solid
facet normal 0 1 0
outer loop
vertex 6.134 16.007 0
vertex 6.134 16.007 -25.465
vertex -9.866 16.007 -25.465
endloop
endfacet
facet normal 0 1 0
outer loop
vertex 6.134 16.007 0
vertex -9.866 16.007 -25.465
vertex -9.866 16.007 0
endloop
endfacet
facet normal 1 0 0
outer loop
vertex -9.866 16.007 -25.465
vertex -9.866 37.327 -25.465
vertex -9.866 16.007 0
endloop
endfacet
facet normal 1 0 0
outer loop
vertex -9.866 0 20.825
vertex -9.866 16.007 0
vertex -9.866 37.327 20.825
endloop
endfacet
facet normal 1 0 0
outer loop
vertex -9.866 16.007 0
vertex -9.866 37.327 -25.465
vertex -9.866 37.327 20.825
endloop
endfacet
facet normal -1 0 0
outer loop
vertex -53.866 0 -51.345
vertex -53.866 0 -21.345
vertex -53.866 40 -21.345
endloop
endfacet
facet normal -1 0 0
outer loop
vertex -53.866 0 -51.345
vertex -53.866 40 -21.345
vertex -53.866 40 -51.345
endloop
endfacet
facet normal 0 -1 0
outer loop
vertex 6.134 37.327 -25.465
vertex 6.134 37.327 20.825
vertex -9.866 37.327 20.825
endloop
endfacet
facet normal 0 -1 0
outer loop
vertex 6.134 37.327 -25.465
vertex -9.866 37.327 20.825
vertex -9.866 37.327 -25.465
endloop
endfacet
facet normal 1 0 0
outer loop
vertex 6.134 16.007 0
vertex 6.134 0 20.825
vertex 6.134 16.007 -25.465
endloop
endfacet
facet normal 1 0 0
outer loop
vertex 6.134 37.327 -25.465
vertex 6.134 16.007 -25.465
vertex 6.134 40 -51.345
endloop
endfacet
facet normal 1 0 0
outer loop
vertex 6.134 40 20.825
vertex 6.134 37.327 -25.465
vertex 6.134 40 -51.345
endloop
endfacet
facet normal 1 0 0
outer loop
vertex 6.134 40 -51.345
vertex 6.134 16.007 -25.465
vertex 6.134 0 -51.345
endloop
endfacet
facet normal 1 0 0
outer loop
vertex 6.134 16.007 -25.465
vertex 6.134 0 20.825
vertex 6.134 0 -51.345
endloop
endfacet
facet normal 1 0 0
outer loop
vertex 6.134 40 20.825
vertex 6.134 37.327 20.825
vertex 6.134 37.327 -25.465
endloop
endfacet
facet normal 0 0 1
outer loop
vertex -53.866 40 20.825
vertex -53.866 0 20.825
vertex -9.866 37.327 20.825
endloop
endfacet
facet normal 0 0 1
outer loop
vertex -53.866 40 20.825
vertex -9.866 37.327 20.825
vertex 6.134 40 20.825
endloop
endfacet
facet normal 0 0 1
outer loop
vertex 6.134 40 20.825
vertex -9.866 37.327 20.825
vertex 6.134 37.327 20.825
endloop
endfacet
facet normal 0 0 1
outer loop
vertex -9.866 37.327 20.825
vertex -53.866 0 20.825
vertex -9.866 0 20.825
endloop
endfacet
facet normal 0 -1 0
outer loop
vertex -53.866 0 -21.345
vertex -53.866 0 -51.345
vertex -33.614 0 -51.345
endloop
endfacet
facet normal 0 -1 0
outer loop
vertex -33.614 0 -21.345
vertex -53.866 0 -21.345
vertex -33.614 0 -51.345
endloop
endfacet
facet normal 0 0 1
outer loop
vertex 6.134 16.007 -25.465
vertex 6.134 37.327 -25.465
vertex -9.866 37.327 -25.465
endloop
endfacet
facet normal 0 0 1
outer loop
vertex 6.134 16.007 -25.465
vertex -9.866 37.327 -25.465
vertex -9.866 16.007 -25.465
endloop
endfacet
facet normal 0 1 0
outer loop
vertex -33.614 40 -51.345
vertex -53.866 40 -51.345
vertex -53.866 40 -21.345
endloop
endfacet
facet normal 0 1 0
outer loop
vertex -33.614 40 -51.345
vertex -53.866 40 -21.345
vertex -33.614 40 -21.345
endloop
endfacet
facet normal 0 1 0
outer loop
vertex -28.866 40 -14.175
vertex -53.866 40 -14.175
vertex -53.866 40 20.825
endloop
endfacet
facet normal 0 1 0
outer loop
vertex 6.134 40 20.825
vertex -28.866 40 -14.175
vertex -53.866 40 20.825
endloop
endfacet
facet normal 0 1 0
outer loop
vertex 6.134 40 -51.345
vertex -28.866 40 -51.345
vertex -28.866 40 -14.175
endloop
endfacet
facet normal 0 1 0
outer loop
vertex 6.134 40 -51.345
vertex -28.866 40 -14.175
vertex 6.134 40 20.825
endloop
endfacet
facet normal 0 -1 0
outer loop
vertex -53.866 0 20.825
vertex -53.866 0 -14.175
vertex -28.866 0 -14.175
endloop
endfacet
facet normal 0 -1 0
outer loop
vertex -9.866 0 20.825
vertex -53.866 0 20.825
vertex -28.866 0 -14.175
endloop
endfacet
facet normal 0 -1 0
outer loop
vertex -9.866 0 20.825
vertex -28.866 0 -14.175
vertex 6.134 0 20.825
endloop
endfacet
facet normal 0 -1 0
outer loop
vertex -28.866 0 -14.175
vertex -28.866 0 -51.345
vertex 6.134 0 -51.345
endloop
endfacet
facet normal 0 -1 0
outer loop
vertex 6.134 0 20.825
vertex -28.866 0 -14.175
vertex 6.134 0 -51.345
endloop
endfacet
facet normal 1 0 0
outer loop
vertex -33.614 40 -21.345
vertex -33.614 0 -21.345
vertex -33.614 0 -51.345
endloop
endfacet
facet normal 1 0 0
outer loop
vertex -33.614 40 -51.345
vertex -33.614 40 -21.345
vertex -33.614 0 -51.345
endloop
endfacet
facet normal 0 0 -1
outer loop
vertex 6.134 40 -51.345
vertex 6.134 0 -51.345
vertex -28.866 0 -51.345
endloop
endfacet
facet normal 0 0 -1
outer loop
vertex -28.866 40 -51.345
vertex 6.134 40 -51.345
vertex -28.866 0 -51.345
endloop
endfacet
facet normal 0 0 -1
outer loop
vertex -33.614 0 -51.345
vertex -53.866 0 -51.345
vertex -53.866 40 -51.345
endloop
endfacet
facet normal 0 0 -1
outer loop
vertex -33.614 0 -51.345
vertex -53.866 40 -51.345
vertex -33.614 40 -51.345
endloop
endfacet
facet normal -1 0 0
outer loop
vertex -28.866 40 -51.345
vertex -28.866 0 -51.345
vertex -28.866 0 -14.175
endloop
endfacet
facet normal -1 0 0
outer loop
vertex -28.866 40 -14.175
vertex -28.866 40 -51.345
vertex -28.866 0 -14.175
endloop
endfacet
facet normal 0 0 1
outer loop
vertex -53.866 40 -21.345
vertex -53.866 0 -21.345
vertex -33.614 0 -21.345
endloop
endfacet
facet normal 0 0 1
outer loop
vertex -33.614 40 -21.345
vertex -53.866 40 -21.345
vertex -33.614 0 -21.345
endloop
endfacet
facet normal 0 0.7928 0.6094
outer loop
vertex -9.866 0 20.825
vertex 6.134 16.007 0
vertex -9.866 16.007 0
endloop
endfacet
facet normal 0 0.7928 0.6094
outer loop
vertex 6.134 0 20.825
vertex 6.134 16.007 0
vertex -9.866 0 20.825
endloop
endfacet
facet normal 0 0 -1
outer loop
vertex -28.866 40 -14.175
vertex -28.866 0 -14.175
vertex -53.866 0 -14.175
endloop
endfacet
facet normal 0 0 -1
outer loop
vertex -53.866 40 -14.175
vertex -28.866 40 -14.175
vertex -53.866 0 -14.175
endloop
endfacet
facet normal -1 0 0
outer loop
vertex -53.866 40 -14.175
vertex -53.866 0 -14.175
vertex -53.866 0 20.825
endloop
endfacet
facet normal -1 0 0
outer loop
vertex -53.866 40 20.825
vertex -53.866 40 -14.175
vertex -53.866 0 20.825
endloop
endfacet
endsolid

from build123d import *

# Parameters (mm, degrees)
EXTRUDE_1_DEPTH     = 40
SKETCH_1_W          = 20.251594387
SKETCH_1_H          = 30
EXTRUDE_1_2_DEPTH   = 40
CUT_EXTRUDE_1_DEPTH = 16


with BuildPart() as part:
    # 草图1 → 凸台-拉伸1 (new body)
    with BuildSketch(Plane(origin=(0, 0, 0), x_dir=(1, 0, 0), z_dir=(0, 1, 0))):
        Polygon((-53.866046678, 14.175497418), (-53.866046678, -20.824502582), (6.133953322, -20.824502582), (6.133953322, 51.344711422), (-28.866046678, 51.344711422), (-28.866046678, 14.175497418), align=None)
    extrude(amount=EXTRUDE_1_DEPTH)

    # 草图2 → 切除-拉伸1 (cut)
    with BuildSketch(Plane(origin=(6.133953322, 0, 0), x_dir=(0, 0, -1), z_dir=(1, 0, 0))):
        Polygon((-20.824502582, 37.326931886), (25.465428213, 37.326931886), (25.465428213, 16.006959993), (0, 16.006959993), (-20.824502582, 0), align=None)
    extrude(amount=-CUT_EXTRUDE_1_DEPTH, mode=Mode.SUBTRACT)


with BuildPart() as body_2:
    # 草图1 → Extrude 1 2 (new body)
    with BuildSketch(Plane(origin=(0, 0, 0), x_dir=(1, 0, 0), z_dir=(0, 1, 0))):
        with Locations((-43.740249484, 36.344711422)):
            Rectangle(SKETCH_1_W, SKETCH_1_H)
    extrude(amount=EXTRUDE_1_2_DEPTH)


solid = Compound([part.part, body_2.part])
